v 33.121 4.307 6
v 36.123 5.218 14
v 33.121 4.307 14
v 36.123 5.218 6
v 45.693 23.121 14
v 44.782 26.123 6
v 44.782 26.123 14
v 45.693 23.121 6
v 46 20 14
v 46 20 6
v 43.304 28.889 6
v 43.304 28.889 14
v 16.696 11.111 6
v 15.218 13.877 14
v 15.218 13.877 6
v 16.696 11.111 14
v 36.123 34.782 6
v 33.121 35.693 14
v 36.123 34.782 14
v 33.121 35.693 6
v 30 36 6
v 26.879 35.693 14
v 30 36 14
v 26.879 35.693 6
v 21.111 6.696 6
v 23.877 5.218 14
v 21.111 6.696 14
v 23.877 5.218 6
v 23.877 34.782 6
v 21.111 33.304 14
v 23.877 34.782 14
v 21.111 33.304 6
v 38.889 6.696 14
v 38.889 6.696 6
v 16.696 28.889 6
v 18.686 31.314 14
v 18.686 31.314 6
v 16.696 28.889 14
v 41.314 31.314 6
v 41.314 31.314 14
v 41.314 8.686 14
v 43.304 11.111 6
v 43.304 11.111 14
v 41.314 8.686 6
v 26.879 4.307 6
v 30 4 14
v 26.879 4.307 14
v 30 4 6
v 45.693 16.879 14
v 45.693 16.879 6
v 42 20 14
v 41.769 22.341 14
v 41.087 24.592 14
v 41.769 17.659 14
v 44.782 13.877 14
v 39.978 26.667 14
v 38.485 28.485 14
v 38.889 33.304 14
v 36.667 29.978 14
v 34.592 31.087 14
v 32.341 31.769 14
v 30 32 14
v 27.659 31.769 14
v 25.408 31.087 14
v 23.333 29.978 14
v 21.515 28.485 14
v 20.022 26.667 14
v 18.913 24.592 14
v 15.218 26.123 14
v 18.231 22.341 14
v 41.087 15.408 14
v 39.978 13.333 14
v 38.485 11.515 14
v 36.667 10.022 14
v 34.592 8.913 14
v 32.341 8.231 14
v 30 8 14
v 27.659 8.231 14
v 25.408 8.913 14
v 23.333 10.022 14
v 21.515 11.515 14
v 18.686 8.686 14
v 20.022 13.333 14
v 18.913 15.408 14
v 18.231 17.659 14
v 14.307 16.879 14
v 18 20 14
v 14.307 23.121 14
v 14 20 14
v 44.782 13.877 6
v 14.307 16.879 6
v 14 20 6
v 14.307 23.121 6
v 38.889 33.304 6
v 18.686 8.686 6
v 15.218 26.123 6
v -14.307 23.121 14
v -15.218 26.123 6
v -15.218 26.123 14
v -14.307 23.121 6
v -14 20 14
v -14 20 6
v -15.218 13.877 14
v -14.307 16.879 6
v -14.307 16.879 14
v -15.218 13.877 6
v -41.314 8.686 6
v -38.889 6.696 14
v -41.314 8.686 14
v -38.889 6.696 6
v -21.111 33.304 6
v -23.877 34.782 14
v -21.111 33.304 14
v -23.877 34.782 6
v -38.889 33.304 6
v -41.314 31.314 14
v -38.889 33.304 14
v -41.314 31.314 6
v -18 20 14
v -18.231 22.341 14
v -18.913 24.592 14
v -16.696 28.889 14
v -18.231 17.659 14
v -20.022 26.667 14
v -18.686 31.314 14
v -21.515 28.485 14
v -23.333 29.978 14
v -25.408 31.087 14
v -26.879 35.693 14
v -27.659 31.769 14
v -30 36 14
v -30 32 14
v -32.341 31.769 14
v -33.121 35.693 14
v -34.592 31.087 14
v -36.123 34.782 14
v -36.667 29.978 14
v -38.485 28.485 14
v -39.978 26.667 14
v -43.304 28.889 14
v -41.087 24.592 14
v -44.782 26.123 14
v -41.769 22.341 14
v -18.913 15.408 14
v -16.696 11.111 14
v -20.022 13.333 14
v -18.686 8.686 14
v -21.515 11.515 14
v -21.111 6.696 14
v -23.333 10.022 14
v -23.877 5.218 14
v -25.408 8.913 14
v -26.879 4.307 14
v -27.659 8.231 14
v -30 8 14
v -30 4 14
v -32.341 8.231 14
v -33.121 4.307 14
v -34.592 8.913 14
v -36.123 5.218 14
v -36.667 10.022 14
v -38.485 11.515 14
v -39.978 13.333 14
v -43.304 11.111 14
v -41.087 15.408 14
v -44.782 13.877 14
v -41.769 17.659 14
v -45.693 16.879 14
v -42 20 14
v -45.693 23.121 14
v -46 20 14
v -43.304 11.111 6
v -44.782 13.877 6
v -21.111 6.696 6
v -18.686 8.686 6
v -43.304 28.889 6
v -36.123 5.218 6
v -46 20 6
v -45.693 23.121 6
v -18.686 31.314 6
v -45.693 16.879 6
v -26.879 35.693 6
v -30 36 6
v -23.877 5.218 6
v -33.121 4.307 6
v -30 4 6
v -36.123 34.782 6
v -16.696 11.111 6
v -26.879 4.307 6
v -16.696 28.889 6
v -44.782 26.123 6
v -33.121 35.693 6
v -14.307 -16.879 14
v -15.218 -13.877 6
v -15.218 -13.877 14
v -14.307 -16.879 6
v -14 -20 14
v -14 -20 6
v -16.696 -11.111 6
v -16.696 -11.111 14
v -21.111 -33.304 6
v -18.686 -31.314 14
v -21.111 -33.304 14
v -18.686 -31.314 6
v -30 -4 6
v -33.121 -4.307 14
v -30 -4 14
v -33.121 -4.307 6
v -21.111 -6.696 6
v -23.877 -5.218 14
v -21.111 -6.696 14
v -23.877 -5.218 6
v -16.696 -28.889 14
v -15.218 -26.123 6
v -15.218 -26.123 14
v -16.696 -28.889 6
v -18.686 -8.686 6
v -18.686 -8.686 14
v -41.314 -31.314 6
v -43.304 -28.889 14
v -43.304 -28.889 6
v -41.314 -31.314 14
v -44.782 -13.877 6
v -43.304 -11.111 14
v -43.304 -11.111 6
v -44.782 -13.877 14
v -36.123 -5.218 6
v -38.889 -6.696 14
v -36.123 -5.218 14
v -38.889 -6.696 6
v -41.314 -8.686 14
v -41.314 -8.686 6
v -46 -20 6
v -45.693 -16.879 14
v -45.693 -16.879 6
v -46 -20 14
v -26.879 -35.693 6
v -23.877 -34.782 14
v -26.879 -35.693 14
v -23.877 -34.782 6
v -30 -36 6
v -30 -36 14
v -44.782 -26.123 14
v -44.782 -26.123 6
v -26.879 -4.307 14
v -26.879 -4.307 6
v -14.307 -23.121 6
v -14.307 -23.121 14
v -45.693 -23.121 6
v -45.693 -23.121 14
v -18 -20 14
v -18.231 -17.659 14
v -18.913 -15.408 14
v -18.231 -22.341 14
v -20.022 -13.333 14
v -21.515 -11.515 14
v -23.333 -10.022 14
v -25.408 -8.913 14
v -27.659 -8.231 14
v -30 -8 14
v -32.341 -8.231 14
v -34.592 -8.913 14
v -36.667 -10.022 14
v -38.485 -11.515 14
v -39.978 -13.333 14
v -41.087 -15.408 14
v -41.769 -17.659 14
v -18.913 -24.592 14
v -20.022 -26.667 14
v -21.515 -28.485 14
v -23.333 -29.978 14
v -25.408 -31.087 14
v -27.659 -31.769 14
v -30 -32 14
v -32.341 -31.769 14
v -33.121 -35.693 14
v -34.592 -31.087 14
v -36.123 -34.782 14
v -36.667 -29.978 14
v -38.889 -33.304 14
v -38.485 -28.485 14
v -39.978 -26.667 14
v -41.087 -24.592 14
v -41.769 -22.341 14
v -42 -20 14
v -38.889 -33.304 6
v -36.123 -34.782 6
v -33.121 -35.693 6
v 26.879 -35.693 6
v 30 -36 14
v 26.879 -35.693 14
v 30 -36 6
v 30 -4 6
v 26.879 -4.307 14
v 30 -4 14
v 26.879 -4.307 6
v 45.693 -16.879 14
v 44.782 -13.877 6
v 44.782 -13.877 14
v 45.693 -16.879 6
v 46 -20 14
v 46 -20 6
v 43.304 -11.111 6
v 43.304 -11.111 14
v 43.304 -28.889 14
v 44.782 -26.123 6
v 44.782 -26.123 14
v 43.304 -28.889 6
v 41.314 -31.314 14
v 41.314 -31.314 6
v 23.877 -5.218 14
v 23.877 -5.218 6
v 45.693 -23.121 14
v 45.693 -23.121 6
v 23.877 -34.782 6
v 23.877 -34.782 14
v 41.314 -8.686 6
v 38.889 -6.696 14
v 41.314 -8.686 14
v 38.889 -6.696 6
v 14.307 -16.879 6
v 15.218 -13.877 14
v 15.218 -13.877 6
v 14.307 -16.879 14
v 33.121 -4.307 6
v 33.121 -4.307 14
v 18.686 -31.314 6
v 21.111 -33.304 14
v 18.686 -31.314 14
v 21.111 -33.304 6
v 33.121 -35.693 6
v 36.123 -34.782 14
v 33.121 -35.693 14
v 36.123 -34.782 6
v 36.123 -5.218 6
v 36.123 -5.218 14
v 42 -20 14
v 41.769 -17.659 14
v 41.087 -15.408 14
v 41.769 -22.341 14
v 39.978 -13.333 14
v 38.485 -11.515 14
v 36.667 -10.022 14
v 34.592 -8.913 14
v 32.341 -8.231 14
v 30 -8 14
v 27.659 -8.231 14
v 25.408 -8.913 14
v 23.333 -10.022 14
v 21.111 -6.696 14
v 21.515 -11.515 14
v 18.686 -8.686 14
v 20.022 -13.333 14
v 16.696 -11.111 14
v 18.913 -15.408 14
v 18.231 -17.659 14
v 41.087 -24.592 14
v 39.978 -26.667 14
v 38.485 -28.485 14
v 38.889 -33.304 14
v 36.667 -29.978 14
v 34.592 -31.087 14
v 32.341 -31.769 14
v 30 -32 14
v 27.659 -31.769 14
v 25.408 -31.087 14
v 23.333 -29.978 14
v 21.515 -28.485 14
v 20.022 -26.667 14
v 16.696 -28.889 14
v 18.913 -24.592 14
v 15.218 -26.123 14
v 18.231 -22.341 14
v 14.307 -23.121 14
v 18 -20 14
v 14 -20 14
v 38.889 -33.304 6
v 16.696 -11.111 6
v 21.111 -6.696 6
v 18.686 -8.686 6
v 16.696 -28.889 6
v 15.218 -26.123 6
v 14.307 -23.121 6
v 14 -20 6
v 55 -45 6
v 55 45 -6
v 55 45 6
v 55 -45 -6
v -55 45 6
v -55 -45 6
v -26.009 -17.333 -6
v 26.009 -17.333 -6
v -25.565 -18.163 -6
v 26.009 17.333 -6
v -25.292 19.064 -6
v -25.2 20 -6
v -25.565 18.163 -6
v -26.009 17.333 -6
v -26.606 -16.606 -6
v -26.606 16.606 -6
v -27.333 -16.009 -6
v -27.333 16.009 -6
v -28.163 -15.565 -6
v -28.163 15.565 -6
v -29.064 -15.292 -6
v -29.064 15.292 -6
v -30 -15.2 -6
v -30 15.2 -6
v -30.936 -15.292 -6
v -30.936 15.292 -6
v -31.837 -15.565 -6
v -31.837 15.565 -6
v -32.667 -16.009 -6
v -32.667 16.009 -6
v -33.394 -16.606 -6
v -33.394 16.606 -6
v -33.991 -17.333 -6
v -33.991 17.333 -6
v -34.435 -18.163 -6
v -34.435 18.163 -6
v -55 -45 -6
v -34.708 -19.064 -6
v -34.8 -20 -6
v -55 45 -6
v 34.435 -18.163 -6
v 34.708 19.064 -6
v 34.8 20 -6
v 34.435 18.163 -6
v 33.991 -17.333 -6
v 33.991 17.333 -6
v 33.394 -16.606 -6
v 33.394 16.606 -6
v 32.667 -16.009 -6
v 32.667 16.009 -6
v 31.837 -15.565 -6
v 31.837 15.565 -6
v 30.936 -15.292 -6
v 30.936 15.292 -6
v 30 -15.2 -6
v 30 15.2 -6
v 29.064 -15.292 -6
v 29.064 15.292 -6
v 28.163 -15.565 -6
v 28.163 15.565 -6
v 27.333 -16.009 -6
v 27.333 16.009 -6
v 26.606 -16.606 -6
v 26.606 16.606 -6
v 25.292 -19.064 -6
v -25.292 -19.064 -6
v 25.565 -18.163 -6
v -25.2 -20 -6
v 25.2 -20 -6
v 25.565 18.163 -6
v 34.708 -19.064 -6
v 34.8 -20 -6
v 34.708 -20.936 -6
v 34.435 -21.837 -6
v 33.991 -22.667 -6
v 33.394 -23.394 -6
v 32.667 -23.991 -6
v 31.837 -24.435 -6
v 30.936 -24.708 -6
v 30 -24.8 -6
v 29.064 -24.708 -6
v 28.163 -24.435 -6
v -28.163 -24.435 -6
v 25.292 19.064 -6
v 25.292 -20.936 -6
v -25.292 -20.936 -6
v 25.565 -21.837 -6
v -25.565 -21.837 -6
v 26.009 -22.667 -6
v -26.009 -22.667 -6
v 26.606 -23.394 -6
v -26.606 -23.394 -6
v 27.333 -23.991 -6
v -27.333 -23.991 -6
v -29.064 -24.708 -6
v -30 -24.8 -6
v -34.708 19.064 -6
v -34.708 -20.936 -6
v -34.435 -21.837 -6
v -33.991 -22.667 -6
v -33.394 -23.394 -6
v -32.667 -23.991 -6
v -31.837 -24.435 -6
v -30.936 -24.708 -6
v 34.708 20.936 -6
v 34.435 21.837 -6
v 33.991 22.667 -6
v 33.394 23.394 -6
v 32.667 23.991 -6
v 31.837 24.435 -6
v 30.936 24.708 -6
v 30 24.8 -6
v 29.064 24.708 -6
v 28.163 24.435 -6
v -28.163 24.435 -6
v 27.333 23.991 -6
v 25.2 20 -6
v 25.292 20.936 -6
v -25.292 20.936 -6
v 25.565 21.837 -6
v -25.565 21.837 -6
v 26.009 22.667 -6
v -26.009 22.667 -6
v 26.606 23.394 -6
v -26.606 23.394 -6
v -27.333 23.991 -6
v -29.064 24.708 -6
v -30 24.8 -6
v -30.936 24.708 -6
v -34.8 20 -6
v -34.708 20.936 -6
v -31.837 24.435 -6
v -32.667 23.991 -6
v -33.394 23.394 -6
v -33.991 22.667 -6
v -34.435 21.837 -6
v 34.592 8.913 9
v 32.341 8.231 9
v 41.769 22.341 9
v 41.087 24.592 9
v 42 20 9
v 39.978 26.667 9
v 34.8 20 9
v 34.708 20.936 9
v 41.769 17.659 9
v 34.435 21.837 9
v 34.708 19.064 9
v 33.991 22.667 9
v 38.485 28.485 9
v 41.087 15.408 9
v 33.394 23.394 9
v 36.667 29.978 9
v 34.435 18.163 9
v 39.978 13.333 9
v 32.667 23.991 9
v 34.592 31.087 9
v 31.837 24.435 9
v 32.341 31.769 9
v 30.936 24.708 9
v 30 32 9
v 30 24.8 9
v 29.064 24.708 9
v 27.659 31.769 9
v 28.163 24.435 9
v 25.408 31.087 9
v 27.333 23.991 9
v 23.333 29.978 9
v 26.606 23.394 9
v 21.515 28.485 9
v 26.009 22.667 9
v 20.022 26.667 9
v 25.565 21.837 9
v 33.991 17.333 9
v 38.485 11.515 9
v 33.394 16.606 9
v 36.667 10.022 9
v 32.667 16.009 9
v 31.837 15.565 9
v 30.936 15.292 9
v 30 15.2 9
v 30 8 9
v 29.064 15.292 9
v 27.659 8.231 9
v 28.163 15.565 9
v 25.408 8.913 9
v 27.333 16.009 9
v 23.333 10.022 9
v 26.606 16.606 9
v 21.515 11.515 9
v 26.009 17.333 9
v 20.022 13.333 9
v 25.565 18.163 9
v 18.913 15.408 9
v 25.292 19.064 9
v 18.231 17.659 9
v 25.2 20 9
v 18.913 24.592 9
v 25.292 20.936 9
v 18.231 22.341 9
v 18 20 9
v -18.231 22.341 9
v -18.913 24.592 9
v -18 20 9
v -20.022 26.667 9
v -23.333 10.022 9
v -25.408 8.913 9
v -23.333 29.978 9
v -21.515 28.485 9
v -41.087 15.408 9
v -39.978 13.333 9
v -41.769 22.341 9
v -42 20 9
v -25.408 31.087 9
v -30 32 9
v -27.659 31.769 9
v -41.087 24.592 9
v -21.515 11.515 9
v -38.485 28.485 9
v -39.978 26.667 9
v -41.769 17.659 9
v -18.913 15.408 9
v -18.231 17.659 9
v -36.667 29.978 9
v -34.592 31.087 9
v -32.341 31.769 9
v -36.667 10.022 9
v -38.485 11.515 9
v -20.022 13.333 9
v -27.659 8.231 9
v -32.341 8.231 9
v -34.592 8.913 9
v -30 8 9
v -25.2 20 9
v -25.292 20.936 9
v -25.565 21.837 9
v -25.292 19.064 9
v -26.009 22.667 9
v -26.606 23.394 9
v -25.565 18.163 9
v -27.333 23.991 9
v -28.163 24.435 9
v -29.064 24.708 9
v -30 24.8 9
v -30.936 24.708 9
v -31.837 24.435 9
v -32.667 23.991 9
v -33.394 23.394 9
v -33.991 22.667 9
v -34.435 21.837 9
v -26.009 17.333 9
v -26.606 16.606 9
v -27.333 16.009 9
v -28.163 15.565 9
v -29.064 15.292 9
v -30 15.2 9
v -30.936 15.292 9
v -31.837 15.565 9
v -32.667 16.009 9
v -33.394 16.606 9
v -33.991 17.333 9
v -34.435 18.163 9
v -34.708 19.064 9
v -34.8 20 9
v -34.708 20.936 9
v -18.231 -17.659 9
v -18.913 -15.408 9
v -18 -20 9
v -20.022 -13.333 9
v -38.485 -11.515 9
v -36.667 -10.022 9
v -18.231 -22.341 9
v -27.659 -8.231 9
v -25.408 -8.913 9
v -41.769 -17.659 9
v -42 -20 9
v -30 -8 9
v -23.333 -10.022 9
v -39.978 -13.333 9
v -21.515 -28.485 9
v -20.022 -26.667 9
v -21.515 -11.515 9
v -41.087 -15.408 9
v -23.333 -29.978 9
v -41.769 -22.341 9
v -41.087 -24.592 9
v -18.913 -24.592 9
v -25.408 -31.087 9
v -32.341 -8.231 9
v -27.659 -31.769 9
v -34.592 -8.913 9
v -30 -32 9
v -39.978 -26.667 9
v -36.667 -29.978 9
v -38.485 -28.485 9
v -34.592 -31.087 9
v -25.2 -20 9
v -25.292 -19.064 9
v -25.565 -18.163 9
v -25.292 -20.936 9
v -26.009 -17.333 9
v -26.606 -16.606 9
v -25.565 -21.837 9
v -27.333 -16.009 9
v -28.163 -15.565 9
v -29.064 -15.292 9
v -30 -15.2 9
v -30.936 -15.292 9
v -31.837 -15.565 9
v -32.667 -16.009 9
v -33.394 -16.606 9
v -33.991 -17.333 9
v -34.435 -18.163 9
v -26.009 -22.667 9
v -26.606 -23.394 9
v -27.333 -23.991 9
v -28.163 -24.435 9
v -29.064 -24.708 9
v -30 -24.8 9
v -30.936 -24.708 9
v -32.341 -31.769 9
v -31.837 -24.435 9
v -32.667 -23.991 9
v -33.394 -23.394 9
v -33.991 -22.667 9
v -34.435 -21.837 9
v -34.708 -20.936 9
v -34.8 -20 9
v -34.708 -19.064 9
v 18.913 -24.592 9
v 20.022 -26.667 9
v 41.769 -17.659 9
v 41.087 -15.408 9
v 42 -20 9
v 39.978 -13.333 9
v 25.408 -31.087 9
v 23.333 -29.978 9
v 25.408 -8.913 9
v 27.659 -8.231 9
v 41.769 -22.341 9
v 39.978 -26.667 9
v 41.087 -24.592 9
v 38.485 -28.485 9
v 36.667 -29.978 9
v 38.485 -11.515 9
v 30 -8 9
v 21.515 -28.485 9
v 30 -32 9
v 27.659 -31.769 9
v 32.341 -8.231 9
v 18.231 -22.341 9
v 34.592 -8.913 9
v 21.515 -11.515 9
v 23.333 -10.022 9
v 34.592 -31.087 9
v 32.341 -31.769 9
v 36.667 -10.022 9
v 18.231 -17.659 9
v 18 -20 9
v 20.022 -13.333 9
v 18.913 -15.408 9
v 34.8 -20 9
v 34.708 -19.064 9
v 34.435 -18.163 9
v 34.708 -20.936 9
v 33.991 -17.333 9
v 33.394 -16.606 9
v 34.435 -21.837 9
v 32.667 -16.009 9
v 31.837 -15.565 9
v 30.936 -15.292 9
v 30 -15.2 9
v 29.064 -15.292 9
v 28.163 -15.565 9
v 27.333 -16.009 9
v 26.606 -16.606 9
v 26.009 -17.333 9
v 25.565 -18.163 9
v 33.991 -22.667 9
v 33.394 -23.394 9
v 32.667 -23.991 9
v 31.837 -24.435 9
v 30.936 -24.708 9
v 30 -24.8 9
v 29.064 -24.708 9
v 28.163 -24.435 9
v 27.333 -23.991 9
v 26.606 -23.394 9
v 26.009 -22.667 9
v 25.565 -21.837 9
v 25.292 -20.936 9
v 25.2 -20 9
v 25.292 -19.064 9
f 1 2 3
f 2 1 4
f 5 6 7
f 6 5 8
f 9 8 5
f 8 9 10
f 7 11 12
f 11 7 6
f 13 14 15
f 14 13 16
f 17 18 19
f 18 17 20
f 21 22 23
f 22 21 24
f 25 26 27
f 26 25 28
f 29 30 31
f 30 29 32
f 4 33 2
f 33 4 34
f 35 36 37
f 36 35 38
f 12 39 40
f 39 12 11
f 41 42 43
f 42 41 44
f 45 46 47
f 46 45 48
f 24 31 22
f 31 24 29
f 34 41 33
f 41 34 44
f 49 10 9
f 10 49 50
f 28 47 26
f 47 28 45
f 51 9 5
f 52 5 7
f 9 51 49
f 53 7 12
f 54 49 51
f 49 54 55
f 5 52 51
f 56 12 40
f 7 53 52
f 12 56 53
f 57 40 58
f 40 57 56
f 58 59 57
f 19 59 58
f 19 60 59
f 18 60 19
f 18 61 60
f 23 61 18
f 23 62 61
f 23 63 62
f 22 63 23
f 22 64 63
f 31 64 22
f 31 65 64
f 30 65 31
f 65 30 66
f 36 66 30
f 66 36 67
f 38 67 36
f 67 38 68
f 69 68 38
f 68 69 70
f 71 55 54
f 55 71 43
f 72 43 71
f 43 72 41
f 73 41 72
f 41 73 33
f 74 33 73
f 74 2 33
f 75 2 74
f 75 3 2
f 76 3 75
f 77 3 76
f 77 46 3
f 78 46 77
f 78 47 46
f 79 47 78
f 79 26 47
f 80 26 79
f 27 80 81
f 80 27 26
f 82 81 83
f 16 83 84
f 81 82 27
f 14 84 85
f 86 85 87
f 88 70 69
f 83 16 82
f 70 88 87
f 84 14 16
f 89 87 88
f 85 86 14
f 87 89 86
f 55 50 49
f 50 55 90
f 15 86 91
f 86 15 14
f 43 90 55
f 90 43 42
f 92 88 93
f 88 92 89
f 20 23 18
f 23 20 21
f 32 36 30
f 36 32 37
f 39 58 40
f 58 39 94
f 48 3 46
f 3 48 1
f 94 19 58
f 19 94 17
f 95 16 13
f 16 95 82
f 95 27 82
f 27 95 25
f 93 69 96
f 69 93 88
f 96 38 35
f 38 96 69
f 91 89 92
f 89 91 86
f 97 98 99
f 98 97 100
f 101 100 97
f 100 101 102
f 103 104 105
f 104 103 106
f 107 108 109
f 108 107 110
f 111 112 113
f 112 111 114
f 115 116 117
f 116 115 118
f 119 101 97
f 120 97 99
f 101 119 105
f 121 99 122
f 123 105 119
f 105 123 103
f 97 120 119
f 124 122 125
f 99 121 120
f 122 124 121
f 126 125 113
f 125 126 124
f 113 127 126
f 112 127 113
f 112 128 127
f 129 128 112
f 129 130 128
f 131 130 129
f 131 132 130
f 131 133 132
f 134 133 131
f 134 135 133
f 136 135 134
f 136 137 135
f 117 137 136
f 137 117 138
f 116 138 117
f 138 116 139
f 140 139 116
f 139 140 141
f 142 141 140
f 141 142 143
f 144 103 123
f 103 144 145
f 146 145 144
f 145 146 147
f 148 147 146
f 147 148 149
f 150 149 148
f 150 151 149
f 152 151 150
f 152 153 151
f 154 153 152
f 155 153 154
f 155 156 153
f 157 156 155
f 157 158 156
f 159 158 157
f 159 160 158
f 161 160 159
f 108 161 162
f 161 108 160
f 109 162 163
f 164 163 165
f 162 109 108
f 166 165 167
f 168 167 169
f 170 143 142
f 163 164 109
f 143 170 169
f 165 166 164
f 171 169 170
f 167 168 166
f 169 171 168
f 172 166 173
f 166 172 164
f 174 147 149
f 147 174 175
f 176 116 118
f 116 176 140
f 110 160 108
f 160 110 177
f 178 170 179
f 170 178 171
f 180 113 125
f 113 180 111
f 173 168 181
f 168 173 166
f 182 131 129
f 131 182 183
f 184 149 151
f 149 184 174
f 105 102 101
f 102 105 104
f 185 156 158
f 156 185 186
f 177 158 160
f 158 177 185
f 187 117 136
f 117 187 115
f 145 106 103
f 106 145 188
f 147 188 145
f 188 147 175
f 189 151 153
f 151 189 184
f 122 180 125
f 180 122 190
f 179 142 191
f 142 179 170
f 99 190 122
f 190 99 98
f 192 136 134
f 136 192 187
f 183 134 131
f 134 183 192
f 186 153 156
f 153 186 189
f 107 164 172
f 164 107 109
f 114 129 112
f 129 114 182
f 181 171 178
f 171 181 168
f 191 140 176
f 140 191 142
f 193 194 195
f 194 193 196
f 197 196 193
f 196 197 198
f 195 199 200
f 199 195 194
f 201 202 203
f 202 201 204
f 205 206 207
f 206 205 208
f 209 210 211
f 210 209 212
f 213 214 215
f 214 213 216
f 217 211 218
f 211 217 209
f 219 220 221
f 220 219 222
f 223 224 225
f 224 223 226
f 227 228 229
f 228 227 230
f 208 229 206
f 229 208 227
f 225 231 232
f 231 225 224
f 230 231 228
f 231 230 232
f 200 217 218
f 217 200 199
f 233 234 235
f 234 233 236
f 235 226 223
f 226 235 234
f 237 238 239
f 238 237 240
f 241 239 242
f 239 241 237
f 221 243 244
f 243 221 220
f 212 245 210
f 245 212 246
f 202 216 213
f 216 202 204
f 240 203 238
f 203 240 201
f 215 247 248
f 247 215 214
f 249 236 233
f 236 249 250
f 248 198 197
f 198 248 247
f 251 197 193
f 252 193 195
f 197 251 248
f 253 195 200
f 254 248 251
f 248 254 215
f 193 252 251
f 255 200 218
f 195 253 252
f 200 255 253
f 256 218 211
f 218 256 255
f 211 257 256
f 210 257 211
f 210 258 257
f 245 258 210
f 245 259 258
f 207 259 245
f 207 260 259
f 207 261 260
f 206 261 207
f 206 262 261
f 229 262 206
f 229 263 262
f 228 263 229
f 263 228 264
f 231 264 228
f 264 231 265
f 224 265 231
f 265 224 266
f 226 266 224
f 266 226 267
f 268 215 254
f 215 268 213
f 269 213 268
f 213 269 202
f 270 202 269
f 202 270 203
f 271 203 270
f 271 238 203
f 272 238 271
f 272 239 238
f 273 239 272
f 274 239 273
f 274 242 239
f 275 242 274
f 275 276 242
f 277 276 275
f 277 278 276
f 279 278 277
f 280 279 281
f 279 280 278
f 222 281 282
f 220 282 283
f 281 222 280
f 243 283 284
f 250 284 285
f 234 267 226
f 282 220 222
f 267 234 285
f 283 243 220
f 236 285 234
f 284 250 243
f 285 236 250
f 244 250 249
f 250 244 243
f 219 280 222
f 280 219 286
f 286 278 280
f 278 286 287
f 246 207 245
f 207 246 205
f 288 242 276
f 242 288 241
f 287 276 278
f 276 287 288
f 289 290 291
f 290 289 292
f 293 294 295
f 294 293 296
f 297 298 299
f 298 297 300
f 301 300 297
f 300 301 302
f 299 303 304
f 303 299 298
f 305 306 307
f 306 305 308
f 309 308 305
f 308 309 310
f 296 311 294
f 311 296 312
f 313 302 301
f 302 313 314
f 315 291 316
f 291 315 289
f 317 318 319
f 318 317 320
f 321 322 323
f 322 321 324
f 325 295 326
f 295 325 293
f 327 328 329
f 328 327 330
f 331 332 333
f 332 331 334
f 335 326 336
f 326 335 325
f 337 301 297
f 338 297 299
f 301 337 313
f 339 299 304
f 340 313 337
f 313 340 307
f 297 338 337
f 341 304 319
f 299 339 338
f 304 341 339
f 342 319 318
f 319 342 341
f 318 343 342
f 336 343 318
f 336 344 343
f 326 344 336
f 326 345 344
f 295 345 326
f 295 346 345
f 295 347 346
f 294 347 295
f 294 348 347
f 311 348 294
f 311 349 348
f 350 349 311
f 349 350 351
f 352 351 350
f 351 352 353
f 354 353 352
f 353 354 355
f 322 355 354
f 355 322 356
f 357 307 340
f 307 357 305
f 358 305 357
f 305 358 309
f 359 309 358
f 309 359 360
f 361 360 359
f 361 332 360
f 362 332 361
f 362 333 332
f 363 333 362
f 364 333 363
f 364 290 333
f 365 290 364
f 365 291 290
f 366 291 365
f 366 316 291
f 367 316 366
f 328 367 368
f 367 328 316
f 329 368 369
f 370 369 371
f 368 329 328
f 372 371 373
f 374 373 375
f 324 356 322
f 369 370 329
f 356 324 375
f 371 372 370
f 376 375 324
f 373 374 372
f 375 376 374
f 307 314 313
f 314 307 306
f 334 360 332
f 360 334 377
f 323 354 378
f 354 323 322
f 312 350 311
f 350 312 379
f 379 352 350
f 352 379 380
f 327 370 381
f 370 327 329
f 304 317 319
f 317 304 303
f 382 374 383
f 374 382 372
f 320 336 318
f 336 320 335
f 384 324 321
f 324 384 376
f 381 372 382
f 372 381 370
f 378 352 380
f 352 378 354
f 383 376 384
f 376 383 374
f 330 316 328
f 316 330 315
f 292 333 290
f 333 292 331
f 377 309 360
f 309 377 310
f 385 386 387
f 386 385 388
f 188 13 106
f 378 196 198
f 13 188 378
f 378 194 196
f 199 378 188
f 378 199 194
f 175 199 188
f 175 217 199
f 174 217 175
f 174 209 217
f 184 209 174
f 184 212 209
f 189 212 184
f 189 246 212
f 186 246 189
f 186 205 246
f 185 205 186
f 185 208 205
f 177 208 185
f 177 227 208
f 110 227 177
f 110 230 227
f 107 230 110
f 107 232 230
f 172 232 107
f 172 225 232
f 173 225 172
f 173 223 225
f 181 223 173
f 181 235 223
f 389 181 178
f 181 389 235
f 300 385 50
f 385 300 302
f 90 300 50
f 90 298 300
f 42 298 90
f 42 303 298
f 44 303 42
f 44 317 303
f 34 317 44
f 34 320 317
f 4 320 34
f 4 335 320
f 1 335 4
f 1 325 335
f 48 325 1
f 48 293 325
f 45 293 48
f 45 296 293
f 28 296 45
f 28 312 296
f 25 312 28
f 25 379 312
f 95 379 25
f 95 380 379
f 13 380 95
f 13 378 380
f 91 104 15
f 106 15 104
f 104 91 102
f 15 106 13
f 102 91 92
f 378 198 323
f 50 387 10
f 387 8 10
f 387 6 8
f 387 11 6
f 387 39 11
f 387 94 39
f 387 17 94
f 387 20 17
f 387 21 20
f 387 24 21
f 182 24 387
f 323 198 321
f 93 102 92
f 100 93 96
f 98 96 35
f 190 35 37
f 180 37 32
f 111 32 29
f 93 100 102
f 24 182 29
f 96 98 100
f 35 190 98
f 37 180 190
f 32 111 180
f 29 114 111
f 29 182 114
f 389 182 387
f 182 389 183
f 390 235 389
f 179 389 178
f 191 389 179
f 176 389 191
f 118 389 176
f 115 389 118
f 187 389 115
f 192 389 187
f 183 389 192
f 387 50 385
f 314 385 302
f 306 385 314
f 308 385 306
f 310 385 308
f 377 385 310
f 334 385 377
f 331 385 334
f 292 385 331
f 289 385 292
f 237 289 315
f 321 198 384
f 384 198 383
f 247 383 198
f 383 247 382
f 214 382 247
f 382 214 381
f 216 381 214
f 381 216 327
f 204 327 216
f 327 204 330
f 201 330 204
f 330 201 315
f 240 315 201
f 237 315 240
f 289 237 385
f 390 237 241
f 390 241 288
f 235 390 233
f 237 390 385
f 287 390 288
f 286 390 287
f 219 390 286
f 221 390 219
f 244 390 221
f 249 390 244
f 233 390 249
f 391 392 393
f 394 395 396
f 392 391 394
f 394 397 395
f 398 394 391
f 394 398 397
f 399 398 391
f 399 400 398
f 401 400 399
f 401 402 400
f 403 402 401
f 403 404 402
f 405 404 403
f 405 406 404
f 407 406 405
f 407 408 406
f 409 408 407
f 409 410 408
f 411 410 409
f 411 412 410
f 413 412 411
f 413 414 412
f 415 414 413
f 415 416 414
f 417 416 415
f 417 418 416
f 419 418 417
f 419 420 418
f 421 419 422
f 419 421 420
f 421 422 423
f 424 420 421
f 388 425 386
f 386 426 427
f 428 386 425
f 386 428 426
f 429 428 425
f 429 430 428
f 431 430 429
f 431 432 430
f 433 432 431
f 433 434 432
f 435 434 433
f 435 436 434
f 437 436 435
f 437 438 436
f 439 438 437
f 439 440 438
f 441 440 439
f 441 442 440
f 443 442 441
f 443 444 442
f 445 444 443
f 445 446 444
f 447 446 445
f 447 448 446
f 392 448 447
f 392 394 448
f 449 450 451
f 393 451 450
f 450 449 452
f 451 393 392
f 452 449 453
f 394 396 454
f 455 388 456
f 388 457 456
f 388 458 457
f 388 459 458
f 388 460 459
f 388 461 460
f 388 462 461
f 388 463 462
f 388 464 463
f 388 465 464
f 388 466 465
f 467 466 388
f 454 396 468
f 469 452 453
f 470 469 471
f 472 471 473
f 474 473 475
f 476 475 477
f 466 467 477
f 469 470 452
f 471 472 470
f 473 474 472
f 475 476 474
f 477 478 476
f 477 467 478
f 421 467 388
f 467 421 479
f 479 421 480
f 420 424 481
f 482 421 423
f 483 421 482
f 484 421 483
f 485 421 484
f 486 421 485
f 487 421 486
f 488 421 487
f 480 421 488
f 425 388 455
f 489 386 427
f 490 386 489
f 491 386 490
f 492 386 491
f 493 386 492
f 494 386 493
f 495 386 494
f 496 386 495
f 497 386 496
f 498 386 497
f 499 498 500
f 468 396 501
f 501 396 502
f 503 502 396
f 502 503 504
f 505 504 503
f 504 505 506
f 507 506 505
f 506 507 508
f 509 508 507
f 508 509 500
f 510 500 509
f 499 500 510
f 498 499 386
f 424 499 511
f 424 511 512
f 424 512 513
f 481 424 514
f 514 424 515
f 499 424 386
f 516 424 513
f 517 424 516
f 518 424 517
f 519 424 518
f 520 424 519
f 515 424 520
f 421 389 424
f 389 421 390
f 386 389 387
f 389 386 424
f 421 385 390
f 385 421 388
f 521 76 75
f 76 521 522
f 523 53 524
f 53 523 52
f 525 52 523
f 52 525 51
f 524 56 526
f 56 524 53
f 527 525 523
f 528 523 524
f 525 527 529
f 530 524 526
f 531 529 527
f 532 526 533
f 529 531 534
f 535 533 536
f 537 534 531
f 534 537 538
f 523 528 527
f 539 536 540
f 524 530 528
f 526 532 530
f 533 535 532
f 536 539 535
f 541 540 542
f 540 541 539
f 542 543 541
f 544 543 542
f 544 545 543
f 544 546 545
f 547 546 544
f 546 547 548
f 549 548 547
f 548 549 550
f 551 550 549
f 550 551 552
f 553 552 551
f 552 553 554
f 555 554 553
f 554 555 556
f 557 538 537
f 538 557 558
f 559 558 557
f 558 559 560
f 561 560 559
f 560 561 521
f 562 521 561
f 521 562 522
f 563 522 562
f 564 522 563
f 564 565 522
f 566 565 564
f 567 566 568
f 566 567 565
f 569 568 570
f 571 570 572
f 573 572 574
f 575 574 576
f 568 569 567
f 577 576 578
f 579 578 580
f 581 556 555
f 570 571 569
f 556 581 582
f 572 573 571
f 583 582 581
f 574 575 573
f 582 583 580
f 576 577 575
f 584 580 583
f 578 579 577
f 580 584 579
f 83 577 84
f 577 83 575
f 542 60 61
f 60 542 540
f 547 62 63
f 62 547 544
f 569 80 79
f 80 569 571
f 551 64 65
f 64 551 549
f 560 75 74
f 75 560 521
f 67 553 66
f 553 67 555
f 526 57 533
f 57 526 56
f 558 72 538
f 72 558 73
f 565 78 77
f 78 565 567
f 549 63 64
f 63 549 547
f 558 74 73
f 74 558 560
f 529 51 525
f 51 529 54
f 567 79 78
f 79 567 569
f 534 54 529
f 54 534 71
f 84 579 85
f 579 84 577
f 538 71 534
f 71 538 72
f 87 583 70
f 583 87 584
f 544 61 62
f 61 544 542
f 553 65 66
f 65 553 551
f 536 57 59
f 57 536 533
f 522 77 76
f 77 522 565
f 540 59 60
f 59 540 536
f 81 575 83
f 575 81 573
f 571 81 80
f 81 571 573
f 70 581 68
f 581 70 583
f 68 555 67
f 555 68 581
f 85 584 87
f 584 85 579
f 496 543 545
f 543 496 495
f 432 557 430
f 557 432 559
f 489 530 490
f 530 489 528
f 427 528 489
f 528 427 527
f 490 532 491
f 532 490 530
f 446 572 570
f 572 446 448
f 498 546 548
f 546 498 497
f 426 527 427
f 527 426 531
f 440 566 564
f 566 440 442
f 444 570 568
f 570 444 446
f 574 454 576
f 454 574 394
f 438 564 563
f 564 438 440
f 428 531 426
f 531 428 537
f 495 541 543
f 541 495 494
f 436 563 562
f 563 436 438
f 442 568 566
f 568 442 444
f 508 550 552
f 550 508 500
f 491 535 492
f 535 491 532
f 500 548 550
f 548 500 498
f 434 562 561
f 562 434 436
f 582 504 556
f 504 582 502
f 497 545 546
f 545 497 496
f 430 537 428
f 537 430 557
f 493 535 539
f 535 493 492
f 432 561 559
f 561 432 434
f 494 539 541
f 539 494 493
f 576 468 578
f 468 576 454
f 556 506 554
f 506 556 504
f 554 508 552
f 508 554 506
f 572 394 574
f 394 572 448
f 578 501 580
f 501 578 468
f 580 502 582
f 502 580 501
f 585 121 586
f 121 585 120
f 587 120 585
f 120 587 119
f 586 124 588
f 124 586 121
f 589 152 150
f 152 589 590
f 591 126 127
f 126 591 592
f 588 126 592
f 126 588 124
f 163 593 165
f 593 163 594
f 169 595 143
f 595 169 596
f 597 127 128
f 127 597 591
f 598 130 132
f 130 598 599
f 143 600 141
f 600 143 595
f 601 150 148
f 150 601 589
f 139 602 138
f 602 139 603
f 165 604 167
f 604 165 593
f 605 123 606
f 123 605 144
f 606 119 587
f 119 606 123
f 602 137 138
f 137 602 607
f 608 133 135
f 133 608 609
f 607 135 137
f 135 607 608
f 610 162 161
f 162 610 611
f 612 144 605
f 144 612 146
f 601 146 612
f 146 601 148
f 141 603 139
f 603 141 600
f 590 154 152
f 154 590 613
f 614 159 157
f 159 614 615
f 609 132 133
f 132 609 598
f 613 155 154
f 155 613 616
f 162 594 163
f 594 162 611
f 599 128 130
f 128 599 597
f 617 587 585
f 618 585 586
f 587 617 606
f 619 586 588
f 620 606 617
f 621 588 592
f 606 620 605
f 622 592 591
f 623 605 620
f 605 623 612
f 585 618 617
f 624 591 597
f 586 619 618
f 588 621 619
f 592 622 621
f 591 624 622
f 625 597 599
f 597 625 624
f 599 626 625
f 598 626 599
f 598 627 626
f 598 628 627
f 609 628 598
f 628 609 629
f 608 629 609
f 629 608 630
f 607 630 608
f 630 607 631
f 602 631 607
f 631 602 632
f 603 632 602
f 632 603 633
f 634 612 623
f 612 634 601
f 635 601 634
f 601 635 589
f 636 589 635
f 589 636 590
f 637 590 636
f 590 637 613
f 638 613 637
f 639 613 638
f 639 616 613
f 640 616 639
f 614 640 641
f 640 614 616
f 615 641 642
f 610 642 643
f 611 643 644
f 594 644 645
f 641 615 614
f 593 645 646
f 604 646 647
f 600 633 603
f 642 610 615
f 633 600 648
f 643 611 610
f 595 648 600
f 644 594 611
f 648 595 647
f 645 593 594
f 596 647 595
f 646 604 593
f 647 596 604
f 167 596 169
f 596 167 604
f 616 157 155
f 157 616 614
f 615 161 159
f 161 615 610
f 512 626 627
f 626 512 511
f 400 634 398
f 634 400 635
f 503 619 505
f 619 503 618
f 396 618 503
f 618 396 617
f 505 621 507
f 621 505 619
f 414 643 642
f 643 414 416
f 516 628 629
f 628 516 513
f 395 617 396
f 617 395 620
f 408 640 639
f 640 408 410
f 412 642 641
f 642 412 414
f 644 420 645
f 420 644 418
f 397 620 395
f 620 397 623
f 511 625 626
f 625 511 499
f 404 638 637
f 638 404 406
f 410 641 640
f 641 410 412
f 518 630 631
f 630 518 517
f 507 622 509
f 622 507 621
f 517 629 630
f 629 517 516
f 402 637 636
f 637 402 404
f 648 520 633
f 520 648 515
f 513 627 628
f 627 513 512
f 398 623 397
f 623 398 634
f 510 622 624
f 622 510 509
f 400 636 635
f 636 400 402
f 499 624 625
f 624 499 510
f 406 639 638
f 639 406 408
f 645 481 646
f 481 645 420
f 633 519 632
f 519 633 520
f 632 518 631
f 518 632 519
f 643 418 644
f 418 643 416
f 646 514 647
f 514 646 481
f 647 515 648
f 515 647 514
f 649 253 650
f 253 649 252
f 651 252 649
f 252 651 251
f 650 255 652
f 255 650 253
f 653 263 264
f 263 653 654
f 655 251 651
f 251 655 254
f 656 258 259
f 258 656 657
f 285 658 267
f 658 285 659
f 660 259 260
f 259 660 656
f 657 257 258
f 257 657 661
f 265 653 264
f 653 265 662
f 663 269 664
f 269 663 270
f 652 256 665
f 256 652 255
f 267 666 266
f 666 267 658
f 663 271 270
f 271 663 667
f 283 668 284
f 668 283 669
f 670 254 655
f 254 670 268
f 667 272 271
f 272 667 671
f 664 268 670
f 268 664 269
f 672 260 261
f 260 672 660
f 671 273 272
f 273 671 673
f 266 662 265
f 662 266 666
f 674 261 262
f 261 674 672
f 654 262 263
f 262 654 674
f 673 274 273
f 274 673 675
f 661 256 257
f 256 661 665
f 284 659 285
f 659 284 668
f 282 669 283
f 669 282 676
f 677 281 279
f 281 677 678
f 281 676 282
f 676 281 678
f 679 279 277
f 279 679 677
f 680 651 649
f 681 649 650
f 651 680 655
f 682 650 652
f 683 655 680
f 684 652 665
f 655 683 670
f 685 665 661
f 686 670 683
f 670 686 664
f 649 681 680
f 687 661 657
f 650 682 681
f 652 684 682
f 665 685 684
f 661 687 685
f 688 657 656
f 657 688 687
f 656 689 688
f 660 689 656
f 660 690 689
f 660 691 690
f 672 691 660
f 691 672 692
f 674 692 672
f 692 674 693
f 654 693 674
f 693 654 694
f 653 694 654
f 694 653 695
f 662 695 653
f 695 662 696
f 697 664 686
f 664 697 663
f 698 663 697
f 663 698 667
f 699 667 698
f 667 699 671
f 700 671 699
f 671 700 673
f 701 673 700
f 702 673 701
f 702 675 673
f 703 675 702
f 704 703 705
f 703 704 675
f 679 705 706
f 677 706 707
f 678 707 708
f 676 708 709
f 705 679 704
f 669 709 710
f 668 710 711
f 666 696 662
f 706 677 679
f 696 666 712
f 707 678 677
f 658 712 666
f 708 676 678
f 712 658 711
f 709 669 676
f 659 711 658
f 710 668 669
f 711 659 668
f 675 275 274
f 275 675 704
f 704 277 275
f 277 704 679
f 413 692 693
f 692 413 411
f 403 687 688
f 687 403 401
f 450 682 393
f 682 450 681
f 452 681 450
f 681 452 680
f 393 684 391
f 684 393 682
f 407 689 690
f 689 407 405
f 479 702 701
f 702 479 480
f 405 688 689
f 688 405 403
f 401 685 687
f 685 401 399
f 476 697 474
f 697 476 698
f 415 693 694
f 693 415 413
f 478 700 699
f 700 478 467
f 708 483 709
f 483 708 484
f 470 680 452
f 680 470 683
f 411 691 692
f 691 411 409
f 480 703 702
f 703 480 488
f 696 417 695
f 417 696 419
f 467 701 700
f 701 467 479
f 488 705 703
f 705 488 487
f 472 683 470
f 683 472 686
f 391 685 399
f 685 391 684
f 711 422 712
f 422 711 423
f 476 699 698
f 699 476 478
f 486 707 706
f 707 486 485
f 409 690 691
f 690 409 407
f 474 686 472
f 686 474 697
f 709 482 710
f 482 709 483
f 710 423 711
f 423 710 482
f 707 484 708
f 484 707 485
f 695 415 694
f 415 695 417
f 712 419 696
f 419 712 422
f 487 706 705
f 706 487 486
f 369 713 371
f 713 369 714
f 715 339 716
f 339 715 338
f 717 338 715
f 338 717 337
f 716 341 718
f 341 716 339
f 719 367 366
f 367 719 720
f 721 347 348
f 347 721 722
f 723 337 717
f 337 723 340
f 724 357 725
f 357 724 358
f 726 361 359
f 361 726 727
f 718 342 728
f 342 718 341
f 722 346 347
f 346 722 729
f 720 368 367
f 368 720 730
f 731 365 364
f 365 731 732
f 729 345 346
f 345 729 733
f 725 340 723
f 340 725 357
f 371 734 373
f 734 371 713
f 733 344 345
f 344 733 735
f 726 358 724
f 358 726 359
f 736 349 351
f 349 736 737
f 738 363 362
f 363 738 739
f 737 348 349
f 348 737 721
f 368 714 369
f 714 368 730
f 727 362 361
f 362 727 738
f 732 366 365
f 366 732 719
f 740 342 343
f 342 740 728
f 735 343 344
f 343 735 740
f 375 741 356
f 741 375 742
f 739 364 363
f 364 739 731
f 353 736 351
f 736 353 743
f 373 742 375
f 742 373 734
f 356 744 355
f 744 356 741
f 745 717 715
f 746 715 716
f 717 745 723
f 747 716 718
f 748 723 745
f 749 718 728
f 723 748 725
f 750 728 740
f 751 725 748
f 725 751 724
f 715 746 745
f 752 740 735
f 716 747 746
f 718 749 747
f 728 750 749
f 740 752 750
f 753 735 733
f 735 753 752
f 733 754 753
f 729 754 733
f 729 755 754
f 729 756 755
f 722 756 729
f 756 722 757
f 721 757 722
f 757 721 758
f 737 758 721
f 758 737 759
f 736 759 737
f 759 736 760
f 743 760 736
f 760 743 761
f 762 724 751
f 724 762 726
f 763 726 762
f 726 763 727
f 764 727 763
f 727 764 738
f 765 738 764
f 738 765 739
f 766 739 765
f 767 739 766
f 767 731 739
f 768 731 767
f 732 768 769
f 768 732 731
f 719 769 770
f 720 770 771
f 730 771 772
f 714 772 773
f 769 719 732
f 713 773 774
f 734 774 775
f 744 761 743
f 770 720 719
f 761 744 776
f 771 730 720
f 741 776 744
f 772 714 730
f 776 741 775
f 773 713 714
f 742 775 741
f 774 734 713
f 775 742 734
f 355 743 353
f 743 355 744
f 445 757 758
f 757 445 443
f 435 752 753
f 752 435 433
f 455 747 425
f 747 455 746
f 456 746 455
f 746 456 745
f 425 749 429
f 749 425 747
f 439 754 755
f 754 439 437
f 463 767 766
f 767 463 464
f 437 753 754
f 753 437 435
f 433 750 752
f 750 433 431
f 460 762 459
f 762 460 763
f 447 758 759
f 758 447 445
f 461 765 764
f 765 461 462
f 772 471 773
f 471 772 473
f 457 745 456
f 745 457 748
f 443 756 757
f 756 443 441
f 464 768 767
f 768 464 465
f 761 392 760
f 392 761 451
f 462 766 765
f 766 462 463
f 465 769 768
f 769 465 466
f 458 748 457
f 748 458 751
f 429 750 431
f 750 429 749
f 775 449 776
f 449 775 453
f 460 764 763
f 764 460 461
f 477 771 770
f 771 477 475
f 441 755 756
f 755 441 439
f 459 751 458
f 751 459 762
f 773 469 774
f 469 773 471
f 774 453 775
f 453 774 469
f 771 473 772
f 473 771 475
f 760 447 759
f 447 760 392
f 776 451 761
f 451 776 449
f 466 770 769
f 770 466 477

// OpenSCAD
$fn = 32;

// ----------------------------------------------------------------------
// Socket pad plate
// bosses with counterbored sockets for the screws
// ----------------------------------------------------------------------

// --- parameters (mm) ---
base_t = 12;            // base plate thickness
boss_h = 8;             // boss height above the base plate
boss_d = 32;            // boss diameter
socket_d = 24;          // socket diameter
socket_depth = 5;       // socket depth from the boss face
bolt_d = 9.6;           // screw clearance hole through the socket floor
plate = [110, 90, 12];  // overall size (x, y, z)
edge = 25;              // boss centre offset from the plate edge
pads = 4;               // boss count, one per corner

// --- derived feature positions (mm) ---
height = base_t + boss_h;        // = 20   overall height of the part
corner_x = plate[0] / 2 - edge;  // = 30   boss centre X
corner_y = plate[1] / 2 - edge;  // = 20   boss centre Y
feature_centers = [
  [corner_x, corner_y],
  [-corner_x, corner_y],
  [-corner_x, -corner_y],
  [corner_x, -corner_y]
];   // boss centres: sockets, holes and the pads themselves are placed from here

// base plate, bosses on feature_centers, socket + through hole in each
difference() {
  union() {
    cube(plate, center = true);
    for (centre = feature_centers)
      translate([centre[0], centre[1], plate[2] / 2 - 1])
        cylinder(d = boss_d, h = boss_h + 1);
  }
  for (centre = feature_centers) {
    translate([centre[0], centre[1], plate[2] / 2 + boss_h - socket_depth])
      cylinder(d = socket_d, h = socket_depth + 1);
    translate([centre[0], centre[1], -height])
      cylinder(d = bolt_d, h = 2 * height + 2);  // through the socket floor
  }
}
